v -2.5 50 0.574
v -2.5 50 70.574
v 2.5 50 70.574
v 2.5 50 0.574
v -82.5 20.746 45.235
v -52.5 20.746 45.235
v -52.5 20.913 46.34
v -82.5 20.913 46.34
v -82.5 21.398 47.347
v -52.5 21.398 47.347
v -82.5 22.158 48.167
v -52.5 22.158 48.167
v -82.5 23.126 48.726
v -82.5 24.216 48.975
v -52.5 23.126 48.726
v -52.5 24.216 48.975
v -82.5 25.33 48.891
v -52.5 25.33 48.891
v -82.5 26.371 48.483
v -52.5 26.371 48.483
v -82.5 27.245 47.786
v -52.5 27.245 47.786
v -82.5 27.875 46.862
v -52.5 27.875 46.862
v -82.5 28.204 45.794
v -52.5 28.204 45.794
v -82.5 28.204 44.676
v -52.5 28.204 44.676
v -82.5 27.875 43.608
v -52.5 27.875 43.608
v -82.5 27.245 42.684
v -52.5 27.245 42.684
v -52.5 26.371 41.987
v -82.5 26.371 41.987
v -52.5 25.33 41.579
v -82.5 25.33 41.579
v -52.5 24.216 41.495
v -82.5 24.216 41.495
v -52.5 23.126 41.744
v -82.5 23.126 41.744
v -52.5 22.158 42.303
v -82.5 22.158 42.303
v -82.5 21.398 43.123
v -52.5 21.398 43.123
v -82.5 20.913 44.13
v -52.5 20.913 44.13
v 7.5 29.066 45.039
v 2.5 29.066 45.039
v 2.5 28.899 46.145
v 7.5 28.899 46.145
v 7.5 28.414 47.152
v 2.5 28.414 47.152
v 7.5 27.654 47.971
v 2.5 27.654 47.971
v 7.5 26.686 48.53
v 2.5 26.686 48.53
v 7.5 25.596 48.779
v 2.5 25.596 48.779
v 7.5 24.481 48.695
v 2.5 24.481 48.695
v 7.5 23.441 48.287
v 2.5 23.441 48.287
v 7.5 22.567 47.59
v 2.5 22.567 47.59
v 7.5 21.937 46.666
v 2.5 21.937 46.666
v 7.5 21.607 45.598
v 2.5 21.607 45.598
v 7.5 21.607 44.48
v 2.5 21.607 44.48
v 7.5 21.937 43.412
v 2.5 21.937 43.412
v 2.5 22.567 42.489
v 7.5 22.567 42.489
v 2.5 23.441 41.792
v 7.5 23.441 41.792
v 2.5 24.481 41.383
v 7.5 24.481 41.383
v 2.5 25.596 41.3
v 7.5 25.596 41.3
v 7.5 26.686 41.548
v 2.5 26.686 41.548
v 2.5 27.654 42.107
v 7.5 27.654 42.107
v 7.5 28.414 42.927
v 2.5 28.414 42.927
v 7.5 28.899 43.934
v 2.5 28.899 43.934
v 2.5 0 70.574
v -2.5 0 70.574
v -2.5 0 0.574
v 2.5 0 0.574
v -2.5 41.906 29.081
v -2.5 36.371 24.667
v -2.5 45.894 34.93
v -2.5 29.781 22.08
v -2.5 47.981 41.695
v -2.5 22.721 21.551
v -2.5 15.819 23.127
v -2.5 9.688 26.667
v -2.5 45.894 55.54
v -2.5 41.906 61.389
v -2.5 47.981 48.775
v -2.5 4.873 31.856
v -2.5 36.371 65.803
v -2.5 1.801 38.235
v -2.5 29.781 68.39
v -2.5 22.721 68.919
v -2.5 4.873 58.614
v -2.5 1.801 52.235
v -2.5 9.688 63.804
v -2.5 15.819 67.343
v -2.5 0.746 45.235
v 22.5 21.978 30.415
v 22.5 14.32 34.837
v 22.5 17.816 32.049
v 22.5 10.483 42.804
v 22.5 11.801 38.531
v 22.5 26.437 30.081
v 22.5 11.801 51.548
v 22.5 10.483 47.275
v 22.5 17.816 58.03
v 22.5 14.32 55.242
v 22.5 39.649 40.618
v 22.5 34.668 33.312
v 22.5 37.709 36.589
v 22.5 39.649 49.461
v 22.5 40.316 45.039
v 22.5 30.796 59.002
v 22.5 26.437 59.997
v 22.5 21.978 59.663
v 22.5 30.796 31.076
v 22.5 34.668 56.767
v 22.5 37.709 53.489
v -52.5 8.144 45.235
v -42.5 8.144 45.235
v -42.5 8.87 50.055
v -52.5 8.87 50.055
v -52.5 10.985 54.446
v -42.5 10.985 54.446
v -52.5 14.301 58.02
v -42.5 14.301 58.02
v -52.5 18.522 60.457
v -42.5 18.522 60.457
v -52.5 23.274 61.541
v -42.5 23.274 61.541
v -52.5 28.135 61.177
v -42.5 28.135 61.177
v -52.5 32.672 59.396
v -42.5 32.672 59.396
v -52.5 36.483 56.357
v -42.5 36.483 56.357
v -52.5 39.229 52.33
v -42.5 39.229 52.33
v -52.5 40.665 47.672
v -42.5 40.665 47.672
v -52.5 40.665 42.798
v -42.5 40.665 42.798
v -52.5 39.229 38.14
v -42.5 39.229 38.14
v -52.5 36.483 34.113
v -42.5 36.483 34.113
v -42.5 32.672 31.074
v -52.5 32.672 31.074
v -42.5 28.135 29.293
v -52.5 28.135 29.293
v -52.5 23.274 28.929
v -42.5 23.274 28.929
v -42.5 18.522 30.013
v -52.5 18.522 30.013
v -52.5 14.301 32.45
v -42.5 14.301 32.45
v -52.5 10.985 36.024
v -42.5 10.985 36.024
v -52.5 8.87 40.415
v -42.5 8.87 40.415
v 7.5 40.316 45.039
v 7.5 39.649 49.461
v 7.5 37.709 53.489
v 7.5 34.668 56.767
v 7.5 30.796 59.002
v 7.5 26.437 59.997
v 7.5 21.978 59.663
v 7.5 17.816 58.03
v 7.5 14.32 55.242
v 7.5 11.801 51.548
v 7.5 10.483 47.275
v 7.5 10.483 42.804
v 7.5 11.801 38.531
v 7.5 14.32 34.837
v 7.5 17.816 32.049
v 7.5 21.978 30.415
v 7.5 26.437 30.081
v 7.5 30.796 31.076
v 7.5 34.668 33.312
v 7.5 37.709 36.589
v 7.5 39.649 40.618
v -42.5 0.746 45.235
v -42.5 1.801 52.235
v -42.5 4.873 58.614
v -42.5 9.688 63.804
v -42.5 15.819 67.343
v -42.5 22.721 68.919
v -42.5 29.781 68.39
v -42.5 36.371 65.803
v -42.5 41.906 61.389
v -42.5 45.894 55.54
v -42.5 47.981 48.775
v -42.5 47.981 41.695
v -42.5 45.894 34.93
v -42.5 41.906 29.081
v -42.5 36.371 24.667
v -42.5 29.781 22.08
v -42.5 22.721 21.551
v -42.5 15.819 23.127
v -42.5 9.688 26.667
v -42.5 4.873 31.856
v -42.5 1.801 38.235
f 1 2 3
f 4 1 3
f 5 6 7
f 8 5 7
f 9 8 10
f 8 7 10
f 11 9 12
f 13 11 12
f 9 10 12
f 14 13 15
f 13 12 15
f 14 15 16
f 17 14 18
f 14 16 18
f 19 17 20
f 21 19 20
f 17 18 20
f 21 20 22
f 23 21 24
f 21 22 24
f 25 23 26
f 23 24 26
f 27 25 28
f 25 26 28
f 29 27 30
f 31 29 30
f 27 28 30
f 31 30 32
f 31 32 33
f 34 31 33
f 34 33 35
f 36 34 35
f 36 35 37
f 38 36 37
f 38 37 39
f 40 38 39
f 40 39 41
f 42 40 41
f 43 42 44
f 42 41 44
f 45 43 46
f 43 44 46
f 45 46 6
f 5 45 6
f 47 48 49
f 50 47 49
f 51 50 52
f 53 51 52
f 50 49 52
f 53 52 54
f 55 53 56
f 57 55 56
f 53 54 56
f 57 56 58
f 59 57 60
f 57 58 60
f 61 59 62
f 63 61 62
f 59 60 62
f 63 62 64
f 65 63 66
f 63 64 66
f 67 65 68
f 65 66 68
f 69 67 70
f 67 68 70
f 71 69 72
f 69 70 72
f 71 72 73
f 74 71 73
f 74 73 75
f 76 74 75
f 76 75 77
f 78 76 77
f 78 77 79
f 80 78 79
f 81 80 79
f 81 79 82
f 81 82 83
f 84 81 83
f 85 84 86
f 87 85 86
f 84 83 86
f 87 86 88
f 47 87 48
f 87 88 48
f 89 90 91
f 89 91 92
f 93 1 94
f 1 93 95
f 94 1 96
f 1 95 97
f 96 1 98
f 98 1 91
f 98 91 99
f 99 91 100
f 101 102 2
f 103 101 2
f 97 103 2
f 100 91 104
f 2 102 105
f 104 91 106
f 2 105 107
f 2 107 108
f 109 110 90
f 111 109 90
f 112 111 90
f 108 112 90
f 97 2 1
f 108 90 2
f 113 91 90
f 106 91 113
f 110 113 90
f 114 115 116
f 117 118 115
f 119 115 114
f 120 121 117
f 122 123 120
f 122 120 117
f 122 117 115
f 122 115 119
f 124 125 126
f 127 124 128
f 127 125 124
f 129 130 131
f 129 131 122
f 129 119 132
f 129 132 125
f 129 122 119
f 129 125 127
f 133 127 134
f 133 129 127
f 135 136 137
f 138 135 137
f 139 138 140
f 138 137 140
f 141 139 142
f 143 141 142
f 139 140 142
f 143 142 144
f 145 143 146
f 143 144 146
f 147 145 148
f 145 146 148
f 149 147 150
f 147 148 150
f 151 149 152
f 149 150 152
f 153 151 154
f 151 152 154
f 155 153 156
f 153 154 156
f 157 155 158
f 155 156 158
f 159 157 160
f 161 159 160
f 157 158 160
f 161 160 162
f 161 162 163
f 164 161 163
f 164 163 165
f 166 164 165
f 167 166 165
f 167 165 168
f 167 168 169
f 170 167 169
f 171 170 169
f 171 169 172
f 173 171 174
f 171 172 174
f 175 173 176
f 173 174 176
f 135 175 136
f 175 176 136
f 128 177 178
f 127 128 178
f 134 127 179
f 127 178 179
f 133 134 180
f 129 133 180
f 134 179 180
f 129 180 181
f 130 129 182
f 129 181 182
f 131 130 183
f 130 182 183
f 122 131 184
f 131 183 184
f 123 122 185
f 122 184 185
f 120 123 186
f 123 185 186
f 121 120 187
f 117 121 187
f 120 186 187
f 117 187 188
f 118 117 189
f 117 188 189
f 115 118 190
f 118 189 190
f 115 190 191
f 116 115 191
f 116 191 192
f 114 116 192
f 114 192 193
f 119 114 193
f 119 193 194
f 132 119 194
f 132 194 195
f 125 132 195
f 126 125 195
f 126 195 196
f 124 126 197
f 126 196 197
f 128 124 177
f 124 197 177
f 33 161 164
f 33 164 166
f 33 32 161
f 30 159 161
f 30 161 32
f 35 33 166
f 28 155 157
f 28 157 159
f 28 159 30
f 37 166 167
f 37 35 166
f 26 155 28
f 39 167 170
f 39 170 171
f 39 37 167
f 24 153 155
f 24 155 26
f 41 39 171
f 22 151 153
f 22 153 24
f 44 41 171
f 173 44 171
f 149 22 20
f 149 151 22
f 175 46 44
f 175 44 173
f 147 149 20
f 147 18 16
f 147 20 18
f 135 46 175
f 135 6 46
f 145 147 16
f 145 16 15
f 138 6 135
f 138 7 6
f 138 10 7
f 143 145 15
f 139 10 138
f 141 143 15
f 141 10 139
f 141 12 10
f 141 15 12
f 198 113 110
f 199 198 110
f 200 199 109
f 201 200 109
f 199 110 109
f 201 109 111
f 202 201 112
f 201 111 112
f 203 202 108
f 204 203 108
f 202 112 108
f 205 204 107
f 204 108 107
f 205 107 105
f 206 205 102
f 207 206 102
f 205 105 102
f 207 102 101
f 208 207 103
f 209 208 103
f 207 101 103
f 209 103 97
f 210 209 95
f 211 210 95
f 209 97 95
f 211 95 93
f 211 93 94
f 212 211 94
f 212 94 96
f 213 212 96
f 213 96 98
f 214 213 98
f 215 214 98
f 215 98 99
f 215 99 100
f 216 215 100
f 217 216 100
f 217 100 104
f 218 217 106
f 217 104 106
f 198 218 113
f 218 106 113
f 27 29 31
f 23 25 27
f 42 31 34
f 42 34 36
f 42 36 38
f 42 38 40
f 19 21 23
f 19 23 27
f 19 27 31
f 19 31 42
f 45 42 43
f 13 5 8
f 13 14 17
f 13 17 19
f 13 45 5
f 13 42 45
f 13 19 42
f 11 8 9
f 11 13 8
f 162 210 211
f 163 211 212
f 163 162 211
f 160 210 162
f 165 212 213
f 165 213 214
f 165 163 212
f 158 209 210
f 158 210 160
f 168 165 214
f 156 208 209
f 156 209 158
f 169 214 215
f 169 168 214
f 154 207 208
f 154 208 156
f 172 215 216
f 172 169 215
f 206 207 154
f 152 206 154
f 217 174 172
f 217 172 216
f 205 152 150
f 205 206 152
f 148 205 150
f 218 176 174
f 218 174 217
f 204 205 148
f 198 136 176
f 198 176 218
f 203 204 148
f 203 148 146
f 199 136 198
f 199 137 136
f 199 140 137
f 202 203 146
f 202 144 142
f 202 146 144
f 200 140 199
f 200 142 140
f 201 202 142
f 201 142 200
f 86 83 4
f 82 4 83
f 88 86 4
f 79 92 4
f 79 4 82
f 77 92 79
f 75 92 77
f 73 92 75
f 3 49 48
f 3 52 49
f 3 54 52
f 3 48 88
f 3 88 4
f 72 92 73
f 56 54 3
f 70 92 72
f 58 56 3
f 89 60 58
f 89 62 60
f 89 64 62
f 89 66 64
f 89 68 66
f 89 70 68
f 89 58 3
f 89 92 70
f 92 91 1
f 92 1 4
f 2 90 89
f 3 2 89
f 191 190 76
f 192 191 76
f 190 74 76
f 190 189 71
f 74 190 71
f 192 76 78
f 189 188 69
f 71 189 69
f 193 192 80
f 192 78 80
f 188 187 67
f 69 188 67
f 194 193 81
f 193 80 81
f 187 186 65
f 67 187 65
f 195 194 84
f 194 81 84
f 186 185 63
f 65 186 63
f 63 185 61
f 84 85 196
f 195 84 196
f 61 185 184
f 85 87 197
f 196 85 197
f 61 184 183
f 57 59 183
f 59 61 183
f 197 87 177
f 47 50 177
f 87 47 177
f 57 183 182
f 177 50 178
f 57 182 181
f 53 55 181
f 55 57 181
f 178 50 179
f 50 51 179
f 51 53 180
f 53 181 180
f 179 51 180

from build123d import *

# Parameters (mm, degrees)
F0_W      = 5
F0_H      = 70
F1_DEPTH  = 50
F2_R      = 23.75
F3_DEPTH  = 40
F4_R      = 16.352072
F5_DEPTH  = 10
F6_R      = 3.75
F7_DEPTH  = 30
F8_R      = 3.75
F9_DEPTH  = 5
F10_R     = 15
F11_DEPTH = 15


with BuildPart() as f1:
    # F0 (on Front) → F1 (new body)
    with BuildSketch(Plane.XZ):
        with Locations((0, 35.574075)):
            Rectangle(F0_W, F0_H)
    extrude(amount=-F1_DEPTH)

    # F2 (on face) → F3 (join)
    with BuildSketch(Plane(origin=(-2.5, 0, 0), x_dir=(0, -1, 0), z_dir=(-1, 0, 0))):
        with Locations((-24.496011, 45.235008)):
            Circle(F2_R)
    extrude(amount=F3_DEPTH)

    # F4 (on face) → F5 (join)
    with BuildSketch(Plane(origin=(-42.5, 0, 0), x_dir=(0, -1, 0), z_dir=(-1, 0, 0))):
        with Locations((-24.496011, 45.235008)):
            Circle(F4_R)
    extrude(amount=F5_DEPTH)

    # F6 (on face) → F7 (join)
    with BuildSketch(Plane(origin=(-52.5, 0, 0), x_dir=(0, -1, 0), z_dir=(-1, 0, 0))):
        with Locations((-24.496011, 45.235008)):
            Circle(F6_R)
    extrude(amount=F7_DEPTH)

    # F8 (on face) → F9 (join)
    with BuildSketch(Plane.YZ.offset(2.5)):
        with Locations((25.3156, 45.039263)):
            Circle(F8_R)
    extrude(amount=F9_DEPTH)

    # F10 (on face) → F11 (join)
    with BuildSketch(Plane.YZ.offset(7.5)):
        with Locations((25.3156, 45.039263)):
            Circle(F10_R)
    extrude(amount=F11_DEPTH)


solid = f1.part
